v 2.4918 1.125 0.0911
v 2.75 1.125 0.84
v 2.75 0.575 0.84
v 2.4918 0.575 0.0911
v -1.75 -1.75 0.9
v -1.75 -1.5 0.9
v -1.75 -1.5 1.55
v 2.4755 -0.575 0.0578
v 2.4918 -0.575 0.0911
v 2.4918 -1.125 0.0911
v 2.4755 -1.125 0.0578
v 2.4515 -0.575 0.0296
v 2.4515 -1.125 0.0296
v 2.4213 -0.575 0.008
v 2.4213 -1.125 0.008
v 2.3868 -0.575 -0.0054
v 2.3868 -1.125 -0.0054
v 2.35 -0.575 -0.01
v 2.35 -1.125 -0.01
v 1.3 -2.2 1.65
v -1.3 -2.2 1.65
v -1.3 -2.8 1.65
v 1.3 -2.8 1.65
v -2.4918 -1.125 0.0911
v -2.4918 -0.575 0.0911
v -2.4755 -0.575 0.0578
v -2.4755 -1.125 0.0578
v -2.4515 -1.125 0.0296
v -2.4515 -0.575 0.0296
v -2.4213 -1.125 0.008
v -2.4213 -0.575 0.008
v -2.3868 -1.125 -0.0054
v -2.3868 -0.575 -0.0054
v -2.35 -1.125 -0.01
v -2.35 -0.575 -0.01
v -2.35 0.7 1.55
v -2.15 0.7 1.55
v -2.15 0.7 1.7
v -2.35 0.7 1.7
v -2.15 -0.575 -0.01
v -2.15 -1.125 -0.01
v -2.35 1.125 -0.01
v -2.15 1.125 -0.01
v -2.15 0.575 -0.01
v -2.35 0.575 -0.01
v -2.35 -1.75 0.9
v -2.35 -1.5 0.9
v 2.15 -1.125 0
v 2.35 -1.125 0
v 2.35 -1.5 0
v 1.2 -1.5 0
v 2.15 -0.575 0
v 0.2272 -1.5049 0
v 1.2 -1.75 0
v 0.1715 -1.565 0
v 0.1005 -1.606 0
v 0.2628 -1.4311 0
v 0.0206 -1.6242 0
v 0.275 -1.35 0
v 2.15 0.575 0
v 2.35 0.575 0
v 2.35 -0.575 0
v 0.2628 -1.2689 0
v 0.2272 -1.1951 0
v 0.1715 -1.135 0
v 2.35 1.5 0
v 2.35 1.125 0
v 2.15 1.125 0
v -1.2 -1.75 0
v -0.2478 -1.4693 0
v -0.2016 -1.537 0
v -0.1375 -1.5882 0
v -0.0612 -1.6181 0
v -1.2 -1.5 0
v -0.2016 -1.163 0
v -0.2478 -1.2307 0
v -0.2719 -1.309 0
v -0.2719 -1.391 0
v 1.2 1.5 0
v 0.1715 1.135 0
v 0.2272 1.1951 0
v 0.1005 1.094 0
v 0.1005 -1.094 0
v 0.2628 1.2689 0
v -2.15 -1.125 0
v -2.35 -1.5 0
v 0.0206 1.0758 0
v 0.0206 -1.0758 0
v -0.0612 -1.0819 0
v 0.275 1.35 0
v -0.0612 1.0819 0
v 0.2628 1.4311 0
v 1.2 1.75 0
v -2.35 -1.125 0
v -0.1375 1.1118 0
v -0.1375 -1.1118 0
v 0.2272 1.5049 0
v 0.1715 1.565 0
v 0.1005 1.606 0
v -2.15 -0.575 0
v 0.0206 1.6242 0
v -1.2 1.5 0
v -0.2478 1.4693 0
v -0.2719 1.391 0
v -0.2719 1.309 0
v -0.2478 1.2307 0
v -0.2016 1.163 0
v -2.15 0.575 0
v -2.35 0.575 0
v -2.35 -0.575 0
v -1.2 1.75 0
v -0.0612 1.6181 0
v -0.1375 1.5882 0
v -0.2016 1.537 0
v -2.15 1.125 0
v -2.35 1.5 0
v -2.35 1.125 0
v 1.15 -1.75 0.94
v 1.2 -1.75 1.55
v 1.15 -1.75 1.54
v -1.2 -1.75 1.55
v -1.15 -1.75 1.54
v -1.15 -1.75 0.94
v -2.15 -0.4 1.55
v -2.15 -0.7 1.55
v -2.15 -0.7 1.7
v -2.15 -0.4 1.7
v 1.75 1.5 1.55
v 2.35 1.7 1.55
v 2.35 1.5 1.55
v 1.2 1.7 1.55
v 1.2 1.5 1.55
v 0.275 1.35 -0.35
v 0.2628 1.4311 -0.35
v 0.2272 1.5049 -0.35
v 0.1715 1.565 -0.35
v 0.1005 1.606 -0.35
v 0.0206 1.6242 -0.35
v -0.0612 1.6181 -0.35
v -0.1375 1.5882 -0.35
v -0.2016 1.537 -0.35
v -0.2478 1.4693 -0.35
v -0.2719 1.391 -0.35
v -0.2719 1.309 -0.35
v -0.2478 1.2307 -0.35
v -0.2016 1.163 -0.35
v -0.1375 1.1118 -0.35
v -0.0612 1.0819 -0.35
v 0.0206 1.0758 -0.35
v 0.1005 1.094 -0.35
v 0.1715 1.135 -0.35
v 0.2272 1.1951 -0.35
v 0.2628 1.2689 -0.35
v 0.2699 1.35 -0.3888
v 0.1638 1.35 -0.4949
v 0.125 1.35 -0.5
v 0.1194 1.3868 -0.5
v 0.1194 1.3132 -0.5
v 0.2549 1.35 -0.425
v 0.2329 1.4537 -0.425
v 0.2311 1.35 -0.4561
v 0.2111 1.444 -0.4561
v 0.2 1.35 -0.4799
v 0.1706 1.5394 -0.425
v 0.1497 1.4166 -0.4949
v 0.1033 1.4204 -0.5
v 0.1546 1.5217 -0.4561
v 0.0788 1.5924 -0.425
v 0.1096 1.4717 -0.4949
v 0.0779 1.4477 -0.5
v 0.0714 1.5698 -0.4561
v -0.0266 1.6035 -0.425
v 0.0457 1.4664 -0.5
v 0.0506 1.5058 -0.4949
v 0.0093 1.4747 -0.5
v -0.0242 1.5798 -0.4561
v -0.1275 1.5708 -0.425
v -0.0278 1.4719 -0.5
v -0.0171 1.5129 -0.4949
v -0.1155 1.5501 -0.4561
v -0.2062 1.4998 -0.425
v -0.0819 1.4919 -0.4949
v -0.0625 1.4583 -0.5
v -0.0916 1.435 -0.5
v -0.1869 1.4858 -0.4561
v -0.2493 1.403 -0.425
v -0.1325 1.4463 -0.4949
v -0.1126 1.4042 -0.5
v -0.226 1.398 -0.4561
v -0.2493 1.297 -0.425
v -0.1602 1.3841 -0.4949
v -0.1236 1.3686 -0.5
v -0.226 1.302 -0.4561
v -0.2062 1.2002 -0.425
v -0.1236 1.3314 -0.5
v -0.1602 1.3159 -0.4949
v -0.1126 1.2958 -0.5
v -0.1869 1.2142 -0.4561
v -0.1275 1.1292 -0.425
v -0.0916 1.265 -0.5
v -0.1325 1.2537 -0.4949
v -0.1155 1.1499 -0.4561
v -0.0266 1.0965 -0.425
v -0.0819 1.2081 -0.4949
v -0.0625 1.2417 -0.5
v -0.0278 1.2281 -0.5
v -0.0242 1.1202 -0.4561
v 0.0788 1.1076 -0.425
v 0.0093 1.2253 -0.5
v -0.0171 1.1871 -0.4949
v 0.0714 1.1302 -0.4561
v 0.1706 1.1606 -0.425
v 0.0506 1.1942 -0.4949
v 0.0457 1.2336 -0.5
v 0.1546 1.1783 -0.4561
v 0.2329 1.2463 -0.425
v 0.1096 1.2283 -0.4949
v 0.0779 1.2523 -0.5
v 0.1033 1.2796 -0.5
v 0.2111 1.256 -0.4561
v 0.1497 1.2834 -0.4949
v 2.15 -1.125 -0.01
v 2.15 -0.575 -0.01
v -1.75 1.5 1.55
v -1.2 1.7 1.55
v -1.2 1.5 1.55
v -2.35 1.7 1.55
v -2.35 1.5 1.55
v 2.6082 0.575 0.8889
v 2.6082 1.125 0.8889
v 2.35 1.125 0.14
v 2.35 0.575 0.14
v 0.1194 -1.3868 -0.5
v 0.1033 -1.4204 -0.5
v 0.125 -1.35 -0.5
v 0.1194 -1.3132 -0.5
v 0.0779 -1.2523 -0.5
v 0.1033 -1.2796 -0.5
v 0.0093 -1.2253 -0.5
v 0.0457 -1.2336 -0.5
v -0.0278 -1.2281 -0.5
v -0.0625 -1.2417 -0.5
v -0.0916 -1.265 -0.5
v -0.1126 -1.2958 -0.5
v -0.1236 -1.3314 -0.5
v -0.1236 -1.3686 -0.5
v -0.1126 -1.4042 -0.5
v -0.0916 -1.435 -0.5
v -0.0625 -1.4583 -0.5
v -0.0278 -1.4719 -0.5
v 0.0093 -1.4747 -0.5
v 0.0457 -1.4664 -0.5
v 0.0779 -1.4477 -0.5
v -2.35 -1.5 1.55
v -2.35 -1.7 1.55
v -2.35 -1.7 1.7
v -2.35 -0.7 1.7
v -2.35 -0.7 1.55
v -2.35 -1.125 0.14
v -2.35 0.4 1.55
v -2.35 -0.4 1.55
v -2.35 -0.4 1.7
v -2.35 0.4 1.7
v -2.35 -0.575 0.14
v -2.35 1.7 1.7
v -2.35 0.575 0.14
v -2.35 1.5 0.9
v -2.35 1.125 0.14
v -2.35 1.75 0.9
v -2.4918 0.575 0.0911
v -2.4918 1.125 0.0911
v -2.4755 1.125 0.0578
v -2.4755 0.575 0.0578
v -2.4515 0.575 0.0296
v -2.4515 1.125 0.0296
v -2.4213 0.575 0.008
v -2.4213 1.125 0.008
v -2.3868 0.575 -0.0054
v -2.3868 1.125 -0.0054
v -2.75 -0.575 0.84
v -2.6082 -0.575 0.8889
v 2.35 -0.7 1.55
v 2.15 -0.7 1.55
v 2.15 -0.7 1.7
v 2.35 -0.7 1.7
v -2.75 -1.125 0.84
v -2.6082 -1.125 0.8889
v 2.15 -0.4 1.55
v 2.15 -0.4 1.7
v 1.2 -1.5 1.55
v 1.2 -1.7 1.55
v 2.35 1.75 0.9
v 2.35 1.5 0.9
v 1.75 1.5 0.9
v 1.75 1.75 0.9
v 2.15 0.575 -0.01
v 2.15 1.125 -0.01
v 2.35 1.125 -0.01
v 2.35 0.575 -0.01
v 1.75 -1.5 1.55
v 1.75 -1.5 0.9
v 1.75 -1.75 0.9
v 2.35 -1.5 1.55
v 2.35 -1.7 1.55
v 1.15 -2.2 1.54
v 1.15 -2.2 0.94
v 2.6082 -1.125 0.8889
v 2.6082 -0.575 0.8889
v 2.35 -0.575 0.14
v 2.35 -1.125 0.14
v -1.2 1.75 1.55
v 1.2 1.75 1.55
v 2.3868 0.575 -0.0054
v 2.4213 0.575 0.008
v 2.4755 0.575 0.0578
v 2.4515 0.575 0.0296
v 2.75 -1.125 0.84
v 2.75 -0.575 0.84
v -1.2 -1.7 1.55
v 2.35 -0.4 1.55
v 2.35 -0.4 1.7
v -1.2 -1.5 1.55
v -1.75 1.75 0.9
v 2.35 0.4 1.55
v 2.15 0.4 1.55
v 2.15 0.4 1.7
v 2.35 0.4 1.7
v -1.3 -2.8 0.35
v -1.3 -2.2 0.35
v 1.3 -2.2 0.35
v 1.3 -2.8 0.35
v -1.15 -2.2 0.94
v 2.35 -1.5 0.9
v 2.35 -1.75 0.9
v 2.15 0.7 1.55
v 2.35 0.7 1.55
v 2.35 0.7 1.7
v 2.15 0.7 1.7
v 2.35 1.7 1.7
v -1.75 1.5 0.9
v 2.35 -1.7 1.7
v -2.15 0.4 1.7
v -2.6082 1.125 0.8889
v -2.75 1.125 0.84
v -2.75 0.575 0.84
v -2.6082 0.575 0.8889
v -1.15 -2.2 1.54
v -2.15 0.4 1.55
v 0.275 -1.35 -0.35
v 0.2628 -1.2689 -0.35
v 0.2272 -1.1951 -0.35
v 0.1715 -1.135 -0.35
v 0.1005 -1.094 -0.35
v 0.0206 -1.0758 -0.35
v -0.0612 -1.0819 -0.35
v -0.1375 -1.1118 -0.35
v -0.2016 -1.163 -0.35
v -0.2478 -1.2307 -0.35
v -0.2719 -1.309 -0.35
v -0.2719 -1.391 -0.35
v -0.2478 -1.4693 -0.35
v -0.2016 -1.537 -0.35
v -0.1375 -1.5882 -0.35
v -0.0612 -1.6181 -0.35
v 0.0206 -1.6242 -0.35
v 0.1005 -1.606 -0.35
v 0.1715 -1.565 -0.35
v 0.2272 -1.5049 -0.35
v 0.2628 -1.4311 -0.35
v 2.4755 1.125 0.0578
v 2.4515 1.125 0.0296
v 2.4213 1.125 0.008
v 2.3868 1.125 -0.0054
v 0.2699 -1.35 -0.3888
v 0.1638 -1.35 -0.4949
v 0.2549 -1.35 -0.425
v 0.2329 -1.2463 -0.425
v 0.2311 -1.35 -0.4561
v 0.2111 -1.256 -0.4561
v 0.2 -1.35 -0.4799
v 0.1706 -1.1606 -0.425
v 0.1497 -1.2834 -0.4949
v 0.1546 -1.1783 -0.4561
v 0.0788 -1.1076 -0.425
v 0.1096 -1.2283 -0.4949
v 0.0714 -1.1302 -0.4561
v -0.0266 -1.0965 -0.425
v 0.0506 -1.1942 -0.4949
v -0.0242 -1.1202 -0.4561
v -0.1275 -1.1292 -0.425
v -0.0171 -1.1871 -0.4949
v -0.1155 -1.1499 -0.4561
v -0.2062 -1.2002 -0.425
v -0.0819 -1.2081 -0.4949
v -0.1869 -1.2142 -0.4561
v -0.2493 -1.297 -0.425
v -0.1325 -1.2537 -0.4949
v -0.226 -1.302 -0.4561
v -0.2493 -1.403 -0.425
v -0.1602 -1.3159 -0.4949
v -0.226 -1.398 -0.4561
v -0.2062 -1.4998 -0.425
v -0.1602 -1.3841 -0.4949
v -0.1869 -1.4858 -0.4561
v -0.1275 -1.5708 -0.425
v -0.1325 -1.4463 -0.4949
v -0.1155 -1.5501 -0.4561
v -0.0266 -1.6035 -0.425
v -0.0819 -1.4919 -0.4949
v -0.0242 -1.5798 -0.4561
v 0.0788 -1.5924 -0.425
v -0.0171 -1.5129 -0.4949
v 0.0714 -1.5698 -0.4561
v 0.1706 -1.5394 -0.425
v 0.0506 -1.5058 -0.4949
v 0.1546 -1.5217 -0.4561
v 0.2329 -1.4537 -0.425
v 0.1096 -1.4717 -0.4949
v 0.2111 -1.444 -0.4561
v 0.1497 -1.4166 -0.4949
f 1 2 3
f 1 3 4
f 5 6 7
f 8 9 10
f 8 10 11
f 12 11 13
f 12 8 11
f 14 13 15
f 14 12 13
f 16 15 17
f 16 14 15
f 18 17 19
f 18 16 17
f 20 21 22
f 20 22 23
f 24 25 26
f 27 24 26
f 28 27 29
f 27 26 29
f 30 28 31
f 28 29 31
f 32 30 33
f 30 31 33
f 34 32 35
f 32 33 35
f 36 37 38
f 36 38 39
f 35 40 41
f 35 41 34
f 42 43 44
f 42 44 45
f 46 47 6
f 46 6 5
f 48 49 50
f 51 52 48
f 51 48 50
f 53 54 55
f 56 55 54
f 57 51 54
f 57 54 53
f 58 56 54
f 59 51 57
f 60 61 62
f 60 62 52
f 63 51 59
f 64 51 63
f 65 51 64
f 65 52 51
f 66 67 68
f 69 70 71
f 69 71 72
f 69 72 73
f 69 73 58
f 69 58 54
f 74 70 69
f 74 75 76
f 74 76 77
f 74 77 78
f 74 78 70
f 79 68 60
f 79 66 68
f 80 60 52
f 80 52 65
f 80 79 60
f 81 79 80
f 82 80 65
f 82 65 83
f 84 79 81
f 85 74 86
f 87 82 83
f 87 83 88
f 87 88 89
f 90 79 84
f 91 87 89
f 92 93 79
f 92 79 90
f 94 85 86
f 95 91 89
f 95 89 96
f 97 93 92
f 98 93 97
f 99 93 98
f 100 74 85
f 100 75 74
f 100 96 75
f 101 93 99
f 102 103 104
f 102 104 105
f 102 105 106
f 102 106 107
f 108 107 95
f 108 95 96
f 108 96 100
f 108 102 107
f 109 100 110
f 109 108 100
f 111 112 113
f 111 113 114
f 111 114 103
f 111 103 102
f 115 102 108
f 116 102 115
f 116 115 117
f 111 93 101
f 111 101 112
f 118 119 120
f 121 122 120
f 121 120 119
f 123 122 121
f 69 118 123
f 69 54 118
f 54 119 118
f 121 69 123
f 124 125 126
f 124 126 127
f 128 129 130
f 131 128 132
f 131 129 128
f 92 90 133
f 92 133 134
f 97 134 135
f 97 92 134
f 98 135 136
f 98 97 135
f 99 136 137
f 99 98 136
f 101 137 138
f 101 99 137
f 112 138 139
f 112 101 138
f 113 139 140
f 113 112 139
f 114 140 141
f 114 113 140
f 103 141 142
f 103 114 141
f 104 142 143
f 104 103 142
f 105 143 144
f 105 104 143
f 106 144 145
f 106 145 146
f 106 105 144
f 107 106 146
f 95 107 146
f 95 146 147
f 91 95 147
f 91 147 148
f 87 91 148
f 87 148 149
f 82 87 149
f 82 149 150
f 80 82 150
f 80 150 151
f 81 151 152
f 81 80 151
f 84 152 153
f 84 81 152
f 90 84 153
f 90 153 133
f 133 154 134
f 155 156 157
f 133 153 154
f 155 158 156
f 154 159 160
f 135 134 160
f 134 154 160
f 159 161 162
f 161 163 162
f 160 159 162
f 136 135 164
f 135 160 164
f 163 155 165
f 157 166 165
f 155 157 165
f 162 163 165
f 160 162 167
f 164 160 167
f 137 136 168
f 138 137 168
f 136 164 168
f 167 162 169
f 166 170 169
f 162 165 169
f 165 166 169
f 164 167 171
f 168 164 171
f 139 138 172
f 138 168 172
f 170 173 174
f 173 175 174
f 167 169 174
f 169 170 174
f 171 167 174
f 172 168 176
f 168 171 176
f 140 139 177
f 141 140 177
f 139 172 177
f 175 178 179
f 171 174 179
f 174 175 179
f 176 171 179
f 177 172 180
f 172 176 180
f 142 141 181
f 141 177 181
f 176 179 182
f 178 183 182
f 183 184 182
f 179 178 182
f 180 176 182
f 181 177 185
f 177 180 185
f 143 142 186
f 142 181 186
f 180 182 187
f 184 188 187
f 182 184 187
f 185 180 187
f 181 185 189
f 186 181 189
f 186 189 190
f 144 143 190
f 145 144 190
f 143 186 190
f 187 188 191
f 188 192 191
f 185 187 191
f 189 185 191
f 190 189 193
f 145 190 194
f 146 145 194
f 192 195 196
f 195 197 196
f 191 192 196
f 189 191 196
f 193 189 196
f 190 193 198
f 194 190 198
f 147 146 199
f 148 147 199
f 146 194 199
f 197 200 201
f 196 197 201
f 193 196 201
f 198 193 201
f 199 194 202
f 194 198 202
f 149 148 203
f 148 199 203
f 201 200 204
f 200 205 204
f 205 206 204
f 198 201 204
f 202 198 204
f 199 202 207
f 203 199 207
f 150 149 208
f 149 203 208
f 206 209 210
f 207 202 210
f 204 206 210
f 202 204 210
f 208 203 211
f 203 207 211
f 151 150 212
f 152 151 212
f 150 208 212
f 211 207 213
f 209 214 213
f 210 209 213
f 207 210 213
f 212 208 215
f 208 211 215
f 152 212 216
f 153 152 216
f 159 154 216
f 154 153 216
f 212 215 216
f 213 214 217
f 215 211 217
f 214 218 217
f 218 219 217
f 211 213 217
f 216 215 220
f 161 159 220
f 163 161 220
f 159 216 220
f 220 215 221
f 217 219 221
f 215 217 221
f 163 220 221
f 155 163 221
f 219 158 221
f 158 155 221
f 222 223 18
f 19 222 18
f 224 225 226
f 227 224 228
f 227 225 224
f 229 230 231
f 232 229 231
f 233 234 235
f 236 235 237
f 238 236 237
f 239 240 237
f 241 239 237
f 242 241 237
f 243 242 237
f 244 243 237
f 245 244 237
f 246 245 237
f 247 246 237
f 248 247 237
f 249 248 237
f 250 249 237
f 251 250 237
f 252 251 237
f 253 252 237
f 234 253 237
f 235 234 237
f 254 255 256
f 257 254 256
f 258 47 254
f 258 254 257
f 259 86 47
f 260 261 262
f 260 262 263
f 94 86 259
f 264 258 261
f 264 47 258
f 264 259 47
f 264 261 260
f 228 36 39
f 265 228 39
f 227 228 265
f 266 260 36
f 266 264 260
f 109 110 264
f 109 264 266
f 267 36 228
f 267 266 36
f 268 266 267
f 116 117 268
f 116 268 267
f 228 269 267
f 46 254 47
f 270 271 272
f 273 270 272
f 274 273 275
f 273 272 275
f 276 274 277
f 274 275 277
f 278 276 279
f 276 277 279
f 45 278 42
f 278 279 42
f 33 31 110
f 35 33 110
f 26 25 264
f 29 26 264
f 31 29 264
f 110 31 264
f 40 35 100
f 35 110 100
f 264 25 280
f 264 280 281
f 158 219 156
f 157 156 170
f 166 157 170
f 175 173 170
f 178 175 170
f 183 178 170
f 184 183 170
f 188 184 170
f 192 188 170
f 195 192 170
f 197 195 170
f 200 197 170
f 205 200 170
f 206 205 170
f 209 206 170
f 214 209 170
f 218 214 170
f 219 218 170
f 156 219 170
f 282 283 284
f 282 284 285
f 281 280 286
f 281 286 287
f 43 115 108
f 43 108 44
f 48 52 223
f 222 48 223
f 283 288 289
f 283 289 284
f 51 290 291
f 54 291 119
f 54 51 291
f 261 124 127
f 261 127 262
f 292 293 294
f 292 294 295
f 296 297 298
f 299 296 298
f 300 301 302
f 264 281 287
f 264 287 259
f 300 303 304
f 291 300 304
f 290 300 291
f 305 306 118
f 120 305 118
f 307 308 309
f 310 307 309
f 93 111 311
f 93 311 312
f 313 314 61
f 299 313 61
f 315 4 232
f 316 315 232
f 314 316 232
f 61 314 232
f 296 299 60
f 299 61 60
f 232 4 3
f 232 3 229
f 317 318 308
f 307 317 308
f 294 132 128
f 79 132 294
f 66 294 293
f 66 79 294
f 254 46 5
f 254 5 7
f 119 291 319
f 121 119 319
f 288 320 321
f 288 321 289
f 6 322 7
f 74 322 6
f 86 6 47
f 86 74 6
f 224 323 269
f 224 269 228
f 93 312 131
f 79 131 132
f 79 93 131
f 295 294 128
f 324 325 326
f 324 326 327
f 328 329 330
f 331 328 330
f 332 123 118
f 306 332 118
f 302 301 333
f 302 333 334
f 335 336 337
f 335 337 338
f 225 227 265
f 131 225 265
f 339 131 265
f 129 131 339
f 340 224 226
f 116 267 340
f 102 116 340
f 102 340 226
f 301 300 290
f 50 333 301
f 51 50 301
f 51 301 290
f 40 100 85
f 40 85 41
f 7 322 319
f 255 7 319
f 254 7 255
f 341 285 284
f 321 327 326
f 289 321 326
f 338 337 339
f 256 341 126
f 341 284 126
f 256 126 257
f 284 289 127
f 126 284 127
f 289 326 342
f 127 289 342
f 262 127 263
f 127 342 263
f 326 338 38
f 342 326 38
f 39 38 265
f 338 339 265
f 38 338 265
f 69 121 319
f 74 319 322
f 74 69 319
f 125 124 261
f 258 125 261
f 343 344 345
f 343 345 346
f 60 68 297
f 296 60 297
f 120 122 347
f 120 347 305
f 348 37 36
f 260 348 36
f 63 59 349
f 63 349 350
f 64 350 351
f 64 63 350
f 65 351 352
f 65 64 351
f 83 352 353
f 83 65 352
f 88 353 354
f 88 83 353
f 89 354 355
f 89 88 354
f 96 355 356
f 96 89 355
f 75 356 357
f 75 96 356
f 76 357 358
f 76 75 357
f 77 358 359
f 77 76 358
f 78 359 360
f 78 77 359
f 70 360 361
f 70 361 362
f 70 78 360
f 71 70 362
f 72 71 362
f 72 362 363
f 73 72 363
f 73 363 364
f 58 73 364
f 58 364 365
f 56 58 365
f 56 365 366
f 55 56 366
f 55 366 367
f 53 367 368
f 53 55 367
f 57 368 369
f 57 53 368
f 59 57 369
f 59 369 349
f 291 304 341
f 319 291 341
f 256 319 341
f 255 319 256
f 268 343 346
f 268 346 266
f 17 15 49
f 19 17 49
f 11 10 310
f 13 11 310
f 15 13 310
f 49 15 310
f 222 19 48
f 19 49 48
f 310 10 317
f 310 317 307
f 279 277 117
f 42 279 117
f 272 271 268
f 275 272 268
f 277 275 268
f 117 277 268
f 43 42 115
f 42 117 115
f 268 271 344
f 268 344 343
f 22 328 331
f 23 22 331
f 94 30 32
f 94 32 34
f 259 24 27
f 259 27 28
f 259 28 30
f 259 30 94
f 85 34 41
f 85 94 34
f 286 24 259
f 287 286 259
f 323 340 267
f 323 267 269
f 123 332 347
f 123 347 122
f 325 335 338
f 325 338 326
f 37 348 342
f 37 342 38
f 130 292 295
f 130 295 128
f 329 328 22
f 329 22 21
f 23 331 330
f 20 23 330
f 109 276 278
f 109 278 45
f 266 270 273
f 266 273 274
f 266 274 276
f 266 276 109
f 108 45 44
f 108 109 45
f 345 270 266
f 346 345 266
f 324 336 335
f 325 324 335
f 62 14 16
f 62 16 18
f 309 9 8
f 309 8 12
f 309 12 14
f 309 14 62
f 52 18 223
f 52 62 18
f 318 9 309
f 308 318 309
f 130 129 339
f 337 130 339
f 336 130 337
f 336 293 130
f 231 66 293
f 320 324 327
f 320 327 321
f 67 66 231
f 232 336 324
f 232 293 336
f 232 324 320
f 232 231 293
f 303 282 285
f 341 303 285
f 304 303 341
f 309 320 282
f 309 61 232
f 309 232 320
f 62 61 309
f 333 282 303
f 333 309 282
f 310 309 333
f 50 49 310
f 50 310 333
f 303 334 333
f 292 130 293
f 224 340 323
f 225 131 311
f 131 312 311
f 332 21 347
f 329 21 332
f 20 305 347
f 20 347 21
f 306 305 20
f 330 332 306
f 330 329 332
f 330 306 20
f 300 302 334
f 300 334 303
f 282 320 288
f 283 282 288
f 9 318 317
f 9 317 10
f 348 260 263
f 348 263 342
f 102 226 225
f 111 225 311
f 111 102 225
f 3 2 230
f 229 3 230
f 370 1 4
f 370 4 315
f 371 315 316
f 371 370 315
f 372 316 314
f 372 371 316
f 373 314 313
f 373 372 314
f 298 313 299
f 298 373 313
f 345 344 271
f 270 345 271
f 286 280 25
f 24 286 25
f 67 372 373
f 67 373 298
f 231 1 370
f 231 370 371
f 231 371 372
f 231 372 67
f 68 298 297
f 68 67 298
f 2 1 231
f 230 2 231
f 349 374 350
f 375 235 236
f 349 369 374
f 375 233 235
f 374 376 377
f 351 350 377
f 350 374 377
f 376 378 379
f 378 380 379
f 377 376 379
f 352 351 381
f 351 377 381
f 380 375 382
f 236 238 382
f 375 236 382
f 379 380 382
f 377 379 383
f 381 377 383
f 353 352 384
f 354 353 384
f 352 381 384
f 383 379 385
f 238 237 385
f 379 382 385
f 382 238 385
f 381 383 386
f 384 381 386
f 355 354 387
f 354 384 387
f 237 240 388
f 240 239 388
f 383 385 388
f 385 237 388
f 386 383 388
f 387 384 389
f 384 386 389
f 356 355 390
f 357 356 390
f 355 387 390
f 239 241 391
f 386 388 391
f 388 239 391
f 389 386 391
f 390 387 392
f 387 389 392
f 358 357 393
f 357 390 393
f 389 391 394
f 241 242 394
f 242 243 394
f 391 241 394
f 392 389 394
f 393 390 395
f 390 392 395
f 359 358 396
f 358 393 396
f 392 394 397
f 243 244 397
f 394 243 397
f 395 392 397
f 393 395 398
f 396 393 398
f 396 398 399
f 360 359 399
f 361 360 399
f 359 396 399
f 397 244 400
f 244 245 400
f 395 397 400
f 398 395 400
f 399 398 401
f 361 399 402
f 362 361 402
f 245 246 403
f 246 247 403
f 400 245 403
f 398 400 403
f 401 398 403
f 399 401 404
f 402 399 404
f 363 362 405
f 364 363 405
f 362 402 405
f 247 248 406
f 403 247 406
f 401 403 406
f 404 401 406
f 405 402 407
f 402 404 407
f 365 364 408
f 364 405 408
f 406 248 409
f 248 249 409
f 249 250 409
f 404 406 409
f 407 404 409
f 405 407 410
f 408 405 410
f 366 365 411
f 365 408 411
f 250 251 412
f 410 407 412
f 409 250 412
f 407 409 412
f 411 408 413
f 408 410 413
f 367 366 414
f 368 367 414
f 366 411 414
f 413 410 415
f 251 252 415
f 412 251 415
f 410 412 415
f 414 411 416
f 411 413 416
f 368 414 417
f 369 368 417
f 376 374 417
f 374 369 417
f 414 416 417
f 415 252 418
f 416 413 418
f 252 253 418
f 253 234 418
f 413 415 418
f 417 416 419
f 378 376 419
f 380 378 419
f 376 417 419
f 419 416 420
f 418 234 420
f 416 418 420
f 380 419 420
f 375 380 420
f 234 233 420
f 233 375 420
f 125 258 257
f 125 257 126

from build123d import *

# Parameters (mm, degrees)
EXTRUDE_DEPTH    = 0.55
ARRAY_Y_COUNT    = 2
ARRAY_Y_PITCH    = 1.7
EXTRUDE003_DEPTH = 0.15
BOX_W            = 2.6
BOX_H            = 0.6
BOX_DEPTH        = 1.3
BOX001_W         = 2.3
BOX001_H         = 1
BOX001_DEPTH     = 0.6
EXTRUDE004_DEPTH = 0.6
ARRAY001_X_COUNT = 2
ARRAY001_X_PITCH = 4.1
ARRAY002_COUNT   = 2
EXTRUDE002_DEPTH = 1.55
SKETCH001_R      = 0.275
EXTRUDE001_DEPTH = 0.5
FILLET_R         = 0.15
ARRAY003_Y_COUNT = 2
ARRAY003_Y_PITCH = 2.7


with BuildPart() as leftlegs:
    # Sketch → Extrude (new body)
    with BuildSketch(Plane.XZ.offset(0.575)):
        with BuildLine():
            Line((-2.75, 0.85), (-2.491809, 0.101109))
            ThreePointArc((-2.491809, 0.101109), (-2.437082, 0.027866), (-2.35, 0))
            Line((-2.15, 0), (-2.35, 0))
            Line((-2.15, 0.15), (-2.15, 0))
            Line((-2.35, 0.15), (-2.15, 0.15))
            Line((-2.608191, 0.898891), (-2.35, 0.15))
            Line((-2.75, 0.85), (-2.608191, 0.898891))
        make_face()
    extrude(amount=EXTRUDE_DEPTH)


with BuildPart() as leftlegs_1:
    # Extrude placement: moved
    add(leftlegs.part.moved(Location((0, 0, -0.01))))

    # Array Y: leftlegs ×2


with BuildPart() as leftlegs_2:
    add(leftlegs_1.part)
    with Locations(*[(0, i * ARRAY_Y_PITCH, 0) for i in range(1, ARRAY_Y_COUNT)]):
        add(leftlegs_1.part)


with BuildPart() as cover:
    # Sketch003 → Extrude003 (new body)
    with BuildSketch(Plane.XY.offset(1.55)):
        Polygon((-2.35, 1.7), (2.35, 1.7), (2.35, 0.7), (2.15, 0.7), (2.15, 0.4), (2.35, 0.4), (2.35, -0.4), (2.15, -0.4), (2.15, -0.7), (2.35, -0.7), (2.35, -1.7), (-2.35, -1.7), (-2.35, -0.7), (-2.15, -0.7), (-2.15, -0.4), (-2.35, -0.4), (-2.35, 0.4), (-2.15, 0.4), (-2.15, 0.7), (-2.35, 0.7), align=None)
    extrude(amount=EXTRUDE003_DEPTH)


with BuildPart() as metal:
    # mirror: instance of leftlegs
    add(leftlegs_2.part.mirror(Plane(origin=(0, 0, 0), x_dir=(0, -1, 0), z_dir=(1, 0, 0))))

    # Fusion: union leftlegs, cover
    add(leftlegs_2.part)
    add(cover.part)


with BuildPart() as notch:
    # Box → Box (new body)
    with BuildSketch(Plane(origin=(-1.3, -2.8, 0.35), x_dir=(1, 0, 0), z_dir=(0, 0, 1))):
        with Locations((1.3, 0.3)):
            Rectangle(BOX_W, BOX_H)
    extrude(amount=BOX_DEPTH)


with BuildPart() as armandnotch:
    # Box001 → Box001 (new body)
    with BuildSketch(Plane(origin=(-1.15, -2.2, 0.94), x_dir=(1, 0, 0), z_dir=(0, 0, 1))):
        with Locations((1.15, 0.5)):
            Rectangle(BOX001_W, BOX001_H)
    extrude(amount=BOX001_DEPTH)

    # Fusion001: union notch
    add(notch.part)


with BuildPart() as claws:
    # Sketch004 → Extrude004 (new body)
    with BuildSketch(Plane.YZ.offset(1.75)):
        Polygon((-1.5, 0.9), (-1.75, 0.9), (-1.5, 1.55), align=None)
    extrude(amount=EXTRUDE004_DEPTH)

    # Array001 X: claws ×2


with BuildPart() as claws_1:
    add(claws.part)
    with Locations(*[(-i * ARRAY001_X_PITCH, 0, 0) for i in range(1, ARRAY001_X_COUNT)]):
        add(claws.part)

    # Array002: claws ×2 about axis
    array002_axis = Axis((0, 0, 0), (0, 0, 1))


with BuildPart() as claws_2:
    add(claws_1.part)
    for i in range(1, ARRAY002_COUNT):
        add(claws_1.part.rotate(array002_axis, i * 360 / ARRAY002_COUNT))


with BuildPart() as housing:
    # Sketch002 → Extrude002 (new body)
    with BuildSketch(Plane.XY):
        Polygon((-2.35, 1.5), (-1.2, 1.5), (-1.2, 1.75), (1.2, 1.75), (1.2, 1.5), (2.35, 1.5), (2.35, -1.5), (1.2, -1.5), (1.2, -1.75), (-1.2, -1.75), (-1.2, -1.5), (-2.35, -1.5), align=None)
    extrude(amount=EXTRUDE002_DEPTH)


with BuildPart() as thau13:
    # Sketch001 → Extrude001 (new body)
    with BuildSketch(Plane.XY):
        with Locations((0, -1.35)):
            Circle(SKETCH001_R)
    extrude(amount=-EXTRUDE001_DEPTH)

    # Fillet
    fillet_edges = [thau13.edges().sort_by_distance(p)[0] for p in [
        (-0.275, -1.35, -0.5),
    ]]
    fillet(fillet_edges, radius=FILLET_R)

    # Array003 Y: THAU13 ×2


with BuildPart() as thau13_1:
    add(thau13.part)
    with Locations(*[(0, i * ARRAY003_Y_PITCH, 0) for i in range(1, ARRAY003_Y_COUNT)]):
        add(thau13.part)

    # Fusion002: union claws, housing
    add(claws_2.part)
    add(housing.part)

    # Fusion003: union metal, armandnotch
    add(metal.part)
    add(armandnotch.part)


solid = thau13_1.part
